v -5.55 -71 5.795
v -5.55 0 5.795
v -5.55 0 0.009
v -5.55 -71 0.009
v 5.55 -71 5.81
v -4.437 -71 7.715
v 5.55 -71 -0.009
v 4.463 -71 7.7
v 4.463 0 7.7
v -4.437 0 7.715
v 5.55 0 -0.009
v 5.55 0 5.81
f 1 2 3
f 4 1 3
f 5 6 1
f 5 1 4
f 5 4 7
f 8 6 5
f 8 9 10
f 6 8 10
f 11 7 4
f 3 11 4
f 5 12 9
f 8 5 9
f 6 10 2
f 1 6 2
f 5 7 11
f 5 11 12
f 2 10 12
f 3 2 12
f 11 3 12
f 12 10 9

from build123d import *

# Parameters (mm, degrees)
F1_DEPTH = 71
F3_DEPTH = 71
F5_DEPTH = 71


with BuildPart() as f1:
    # F0 (on Front) → F1 (new body)
    with BuildSketch(Plane.XZ):
        Polygon((8.899987, -0.01517), (4.463131, 7.70003), (-4.436856, 7.7152), (-8.899987, 0.01517), (-4.463131, -7.70003), (4.436856, -7.7152), align=None)
    extrude(amount=F1_DEPTH)

    # F2 (on face) → F3 (cut)
    with BuildSketch(Plane.XZ.offset(71)):
        Polygon((8.899987, -0.01517), (-8.899987, 0.01517), (-4.463131, -7.70003), (4.436856, -7.7152), align=None)
    extrude(amount=-F3_DEPTH, mode=Mode.SUBTRACT)

    # F4 (on face) → F5 (cut)
    with BuildSketch(Plane(origin=(0, 0, 0), x_dir=(-1, 0, 0), z_dir=(0, 1, 0))):
        Polygon((-5.549992, 5.8101), (-8.899987, -0.01517), (-5.549992, -0.00946), align=None)
        Polygon((5.549992, 0.00946), (8.899987, 0.01517), (5.549992, 5.794759), align=None)
    extrude(amount=-F5_DEPTH, mode=Mode.SUBTRACT)


solid = f1.part
